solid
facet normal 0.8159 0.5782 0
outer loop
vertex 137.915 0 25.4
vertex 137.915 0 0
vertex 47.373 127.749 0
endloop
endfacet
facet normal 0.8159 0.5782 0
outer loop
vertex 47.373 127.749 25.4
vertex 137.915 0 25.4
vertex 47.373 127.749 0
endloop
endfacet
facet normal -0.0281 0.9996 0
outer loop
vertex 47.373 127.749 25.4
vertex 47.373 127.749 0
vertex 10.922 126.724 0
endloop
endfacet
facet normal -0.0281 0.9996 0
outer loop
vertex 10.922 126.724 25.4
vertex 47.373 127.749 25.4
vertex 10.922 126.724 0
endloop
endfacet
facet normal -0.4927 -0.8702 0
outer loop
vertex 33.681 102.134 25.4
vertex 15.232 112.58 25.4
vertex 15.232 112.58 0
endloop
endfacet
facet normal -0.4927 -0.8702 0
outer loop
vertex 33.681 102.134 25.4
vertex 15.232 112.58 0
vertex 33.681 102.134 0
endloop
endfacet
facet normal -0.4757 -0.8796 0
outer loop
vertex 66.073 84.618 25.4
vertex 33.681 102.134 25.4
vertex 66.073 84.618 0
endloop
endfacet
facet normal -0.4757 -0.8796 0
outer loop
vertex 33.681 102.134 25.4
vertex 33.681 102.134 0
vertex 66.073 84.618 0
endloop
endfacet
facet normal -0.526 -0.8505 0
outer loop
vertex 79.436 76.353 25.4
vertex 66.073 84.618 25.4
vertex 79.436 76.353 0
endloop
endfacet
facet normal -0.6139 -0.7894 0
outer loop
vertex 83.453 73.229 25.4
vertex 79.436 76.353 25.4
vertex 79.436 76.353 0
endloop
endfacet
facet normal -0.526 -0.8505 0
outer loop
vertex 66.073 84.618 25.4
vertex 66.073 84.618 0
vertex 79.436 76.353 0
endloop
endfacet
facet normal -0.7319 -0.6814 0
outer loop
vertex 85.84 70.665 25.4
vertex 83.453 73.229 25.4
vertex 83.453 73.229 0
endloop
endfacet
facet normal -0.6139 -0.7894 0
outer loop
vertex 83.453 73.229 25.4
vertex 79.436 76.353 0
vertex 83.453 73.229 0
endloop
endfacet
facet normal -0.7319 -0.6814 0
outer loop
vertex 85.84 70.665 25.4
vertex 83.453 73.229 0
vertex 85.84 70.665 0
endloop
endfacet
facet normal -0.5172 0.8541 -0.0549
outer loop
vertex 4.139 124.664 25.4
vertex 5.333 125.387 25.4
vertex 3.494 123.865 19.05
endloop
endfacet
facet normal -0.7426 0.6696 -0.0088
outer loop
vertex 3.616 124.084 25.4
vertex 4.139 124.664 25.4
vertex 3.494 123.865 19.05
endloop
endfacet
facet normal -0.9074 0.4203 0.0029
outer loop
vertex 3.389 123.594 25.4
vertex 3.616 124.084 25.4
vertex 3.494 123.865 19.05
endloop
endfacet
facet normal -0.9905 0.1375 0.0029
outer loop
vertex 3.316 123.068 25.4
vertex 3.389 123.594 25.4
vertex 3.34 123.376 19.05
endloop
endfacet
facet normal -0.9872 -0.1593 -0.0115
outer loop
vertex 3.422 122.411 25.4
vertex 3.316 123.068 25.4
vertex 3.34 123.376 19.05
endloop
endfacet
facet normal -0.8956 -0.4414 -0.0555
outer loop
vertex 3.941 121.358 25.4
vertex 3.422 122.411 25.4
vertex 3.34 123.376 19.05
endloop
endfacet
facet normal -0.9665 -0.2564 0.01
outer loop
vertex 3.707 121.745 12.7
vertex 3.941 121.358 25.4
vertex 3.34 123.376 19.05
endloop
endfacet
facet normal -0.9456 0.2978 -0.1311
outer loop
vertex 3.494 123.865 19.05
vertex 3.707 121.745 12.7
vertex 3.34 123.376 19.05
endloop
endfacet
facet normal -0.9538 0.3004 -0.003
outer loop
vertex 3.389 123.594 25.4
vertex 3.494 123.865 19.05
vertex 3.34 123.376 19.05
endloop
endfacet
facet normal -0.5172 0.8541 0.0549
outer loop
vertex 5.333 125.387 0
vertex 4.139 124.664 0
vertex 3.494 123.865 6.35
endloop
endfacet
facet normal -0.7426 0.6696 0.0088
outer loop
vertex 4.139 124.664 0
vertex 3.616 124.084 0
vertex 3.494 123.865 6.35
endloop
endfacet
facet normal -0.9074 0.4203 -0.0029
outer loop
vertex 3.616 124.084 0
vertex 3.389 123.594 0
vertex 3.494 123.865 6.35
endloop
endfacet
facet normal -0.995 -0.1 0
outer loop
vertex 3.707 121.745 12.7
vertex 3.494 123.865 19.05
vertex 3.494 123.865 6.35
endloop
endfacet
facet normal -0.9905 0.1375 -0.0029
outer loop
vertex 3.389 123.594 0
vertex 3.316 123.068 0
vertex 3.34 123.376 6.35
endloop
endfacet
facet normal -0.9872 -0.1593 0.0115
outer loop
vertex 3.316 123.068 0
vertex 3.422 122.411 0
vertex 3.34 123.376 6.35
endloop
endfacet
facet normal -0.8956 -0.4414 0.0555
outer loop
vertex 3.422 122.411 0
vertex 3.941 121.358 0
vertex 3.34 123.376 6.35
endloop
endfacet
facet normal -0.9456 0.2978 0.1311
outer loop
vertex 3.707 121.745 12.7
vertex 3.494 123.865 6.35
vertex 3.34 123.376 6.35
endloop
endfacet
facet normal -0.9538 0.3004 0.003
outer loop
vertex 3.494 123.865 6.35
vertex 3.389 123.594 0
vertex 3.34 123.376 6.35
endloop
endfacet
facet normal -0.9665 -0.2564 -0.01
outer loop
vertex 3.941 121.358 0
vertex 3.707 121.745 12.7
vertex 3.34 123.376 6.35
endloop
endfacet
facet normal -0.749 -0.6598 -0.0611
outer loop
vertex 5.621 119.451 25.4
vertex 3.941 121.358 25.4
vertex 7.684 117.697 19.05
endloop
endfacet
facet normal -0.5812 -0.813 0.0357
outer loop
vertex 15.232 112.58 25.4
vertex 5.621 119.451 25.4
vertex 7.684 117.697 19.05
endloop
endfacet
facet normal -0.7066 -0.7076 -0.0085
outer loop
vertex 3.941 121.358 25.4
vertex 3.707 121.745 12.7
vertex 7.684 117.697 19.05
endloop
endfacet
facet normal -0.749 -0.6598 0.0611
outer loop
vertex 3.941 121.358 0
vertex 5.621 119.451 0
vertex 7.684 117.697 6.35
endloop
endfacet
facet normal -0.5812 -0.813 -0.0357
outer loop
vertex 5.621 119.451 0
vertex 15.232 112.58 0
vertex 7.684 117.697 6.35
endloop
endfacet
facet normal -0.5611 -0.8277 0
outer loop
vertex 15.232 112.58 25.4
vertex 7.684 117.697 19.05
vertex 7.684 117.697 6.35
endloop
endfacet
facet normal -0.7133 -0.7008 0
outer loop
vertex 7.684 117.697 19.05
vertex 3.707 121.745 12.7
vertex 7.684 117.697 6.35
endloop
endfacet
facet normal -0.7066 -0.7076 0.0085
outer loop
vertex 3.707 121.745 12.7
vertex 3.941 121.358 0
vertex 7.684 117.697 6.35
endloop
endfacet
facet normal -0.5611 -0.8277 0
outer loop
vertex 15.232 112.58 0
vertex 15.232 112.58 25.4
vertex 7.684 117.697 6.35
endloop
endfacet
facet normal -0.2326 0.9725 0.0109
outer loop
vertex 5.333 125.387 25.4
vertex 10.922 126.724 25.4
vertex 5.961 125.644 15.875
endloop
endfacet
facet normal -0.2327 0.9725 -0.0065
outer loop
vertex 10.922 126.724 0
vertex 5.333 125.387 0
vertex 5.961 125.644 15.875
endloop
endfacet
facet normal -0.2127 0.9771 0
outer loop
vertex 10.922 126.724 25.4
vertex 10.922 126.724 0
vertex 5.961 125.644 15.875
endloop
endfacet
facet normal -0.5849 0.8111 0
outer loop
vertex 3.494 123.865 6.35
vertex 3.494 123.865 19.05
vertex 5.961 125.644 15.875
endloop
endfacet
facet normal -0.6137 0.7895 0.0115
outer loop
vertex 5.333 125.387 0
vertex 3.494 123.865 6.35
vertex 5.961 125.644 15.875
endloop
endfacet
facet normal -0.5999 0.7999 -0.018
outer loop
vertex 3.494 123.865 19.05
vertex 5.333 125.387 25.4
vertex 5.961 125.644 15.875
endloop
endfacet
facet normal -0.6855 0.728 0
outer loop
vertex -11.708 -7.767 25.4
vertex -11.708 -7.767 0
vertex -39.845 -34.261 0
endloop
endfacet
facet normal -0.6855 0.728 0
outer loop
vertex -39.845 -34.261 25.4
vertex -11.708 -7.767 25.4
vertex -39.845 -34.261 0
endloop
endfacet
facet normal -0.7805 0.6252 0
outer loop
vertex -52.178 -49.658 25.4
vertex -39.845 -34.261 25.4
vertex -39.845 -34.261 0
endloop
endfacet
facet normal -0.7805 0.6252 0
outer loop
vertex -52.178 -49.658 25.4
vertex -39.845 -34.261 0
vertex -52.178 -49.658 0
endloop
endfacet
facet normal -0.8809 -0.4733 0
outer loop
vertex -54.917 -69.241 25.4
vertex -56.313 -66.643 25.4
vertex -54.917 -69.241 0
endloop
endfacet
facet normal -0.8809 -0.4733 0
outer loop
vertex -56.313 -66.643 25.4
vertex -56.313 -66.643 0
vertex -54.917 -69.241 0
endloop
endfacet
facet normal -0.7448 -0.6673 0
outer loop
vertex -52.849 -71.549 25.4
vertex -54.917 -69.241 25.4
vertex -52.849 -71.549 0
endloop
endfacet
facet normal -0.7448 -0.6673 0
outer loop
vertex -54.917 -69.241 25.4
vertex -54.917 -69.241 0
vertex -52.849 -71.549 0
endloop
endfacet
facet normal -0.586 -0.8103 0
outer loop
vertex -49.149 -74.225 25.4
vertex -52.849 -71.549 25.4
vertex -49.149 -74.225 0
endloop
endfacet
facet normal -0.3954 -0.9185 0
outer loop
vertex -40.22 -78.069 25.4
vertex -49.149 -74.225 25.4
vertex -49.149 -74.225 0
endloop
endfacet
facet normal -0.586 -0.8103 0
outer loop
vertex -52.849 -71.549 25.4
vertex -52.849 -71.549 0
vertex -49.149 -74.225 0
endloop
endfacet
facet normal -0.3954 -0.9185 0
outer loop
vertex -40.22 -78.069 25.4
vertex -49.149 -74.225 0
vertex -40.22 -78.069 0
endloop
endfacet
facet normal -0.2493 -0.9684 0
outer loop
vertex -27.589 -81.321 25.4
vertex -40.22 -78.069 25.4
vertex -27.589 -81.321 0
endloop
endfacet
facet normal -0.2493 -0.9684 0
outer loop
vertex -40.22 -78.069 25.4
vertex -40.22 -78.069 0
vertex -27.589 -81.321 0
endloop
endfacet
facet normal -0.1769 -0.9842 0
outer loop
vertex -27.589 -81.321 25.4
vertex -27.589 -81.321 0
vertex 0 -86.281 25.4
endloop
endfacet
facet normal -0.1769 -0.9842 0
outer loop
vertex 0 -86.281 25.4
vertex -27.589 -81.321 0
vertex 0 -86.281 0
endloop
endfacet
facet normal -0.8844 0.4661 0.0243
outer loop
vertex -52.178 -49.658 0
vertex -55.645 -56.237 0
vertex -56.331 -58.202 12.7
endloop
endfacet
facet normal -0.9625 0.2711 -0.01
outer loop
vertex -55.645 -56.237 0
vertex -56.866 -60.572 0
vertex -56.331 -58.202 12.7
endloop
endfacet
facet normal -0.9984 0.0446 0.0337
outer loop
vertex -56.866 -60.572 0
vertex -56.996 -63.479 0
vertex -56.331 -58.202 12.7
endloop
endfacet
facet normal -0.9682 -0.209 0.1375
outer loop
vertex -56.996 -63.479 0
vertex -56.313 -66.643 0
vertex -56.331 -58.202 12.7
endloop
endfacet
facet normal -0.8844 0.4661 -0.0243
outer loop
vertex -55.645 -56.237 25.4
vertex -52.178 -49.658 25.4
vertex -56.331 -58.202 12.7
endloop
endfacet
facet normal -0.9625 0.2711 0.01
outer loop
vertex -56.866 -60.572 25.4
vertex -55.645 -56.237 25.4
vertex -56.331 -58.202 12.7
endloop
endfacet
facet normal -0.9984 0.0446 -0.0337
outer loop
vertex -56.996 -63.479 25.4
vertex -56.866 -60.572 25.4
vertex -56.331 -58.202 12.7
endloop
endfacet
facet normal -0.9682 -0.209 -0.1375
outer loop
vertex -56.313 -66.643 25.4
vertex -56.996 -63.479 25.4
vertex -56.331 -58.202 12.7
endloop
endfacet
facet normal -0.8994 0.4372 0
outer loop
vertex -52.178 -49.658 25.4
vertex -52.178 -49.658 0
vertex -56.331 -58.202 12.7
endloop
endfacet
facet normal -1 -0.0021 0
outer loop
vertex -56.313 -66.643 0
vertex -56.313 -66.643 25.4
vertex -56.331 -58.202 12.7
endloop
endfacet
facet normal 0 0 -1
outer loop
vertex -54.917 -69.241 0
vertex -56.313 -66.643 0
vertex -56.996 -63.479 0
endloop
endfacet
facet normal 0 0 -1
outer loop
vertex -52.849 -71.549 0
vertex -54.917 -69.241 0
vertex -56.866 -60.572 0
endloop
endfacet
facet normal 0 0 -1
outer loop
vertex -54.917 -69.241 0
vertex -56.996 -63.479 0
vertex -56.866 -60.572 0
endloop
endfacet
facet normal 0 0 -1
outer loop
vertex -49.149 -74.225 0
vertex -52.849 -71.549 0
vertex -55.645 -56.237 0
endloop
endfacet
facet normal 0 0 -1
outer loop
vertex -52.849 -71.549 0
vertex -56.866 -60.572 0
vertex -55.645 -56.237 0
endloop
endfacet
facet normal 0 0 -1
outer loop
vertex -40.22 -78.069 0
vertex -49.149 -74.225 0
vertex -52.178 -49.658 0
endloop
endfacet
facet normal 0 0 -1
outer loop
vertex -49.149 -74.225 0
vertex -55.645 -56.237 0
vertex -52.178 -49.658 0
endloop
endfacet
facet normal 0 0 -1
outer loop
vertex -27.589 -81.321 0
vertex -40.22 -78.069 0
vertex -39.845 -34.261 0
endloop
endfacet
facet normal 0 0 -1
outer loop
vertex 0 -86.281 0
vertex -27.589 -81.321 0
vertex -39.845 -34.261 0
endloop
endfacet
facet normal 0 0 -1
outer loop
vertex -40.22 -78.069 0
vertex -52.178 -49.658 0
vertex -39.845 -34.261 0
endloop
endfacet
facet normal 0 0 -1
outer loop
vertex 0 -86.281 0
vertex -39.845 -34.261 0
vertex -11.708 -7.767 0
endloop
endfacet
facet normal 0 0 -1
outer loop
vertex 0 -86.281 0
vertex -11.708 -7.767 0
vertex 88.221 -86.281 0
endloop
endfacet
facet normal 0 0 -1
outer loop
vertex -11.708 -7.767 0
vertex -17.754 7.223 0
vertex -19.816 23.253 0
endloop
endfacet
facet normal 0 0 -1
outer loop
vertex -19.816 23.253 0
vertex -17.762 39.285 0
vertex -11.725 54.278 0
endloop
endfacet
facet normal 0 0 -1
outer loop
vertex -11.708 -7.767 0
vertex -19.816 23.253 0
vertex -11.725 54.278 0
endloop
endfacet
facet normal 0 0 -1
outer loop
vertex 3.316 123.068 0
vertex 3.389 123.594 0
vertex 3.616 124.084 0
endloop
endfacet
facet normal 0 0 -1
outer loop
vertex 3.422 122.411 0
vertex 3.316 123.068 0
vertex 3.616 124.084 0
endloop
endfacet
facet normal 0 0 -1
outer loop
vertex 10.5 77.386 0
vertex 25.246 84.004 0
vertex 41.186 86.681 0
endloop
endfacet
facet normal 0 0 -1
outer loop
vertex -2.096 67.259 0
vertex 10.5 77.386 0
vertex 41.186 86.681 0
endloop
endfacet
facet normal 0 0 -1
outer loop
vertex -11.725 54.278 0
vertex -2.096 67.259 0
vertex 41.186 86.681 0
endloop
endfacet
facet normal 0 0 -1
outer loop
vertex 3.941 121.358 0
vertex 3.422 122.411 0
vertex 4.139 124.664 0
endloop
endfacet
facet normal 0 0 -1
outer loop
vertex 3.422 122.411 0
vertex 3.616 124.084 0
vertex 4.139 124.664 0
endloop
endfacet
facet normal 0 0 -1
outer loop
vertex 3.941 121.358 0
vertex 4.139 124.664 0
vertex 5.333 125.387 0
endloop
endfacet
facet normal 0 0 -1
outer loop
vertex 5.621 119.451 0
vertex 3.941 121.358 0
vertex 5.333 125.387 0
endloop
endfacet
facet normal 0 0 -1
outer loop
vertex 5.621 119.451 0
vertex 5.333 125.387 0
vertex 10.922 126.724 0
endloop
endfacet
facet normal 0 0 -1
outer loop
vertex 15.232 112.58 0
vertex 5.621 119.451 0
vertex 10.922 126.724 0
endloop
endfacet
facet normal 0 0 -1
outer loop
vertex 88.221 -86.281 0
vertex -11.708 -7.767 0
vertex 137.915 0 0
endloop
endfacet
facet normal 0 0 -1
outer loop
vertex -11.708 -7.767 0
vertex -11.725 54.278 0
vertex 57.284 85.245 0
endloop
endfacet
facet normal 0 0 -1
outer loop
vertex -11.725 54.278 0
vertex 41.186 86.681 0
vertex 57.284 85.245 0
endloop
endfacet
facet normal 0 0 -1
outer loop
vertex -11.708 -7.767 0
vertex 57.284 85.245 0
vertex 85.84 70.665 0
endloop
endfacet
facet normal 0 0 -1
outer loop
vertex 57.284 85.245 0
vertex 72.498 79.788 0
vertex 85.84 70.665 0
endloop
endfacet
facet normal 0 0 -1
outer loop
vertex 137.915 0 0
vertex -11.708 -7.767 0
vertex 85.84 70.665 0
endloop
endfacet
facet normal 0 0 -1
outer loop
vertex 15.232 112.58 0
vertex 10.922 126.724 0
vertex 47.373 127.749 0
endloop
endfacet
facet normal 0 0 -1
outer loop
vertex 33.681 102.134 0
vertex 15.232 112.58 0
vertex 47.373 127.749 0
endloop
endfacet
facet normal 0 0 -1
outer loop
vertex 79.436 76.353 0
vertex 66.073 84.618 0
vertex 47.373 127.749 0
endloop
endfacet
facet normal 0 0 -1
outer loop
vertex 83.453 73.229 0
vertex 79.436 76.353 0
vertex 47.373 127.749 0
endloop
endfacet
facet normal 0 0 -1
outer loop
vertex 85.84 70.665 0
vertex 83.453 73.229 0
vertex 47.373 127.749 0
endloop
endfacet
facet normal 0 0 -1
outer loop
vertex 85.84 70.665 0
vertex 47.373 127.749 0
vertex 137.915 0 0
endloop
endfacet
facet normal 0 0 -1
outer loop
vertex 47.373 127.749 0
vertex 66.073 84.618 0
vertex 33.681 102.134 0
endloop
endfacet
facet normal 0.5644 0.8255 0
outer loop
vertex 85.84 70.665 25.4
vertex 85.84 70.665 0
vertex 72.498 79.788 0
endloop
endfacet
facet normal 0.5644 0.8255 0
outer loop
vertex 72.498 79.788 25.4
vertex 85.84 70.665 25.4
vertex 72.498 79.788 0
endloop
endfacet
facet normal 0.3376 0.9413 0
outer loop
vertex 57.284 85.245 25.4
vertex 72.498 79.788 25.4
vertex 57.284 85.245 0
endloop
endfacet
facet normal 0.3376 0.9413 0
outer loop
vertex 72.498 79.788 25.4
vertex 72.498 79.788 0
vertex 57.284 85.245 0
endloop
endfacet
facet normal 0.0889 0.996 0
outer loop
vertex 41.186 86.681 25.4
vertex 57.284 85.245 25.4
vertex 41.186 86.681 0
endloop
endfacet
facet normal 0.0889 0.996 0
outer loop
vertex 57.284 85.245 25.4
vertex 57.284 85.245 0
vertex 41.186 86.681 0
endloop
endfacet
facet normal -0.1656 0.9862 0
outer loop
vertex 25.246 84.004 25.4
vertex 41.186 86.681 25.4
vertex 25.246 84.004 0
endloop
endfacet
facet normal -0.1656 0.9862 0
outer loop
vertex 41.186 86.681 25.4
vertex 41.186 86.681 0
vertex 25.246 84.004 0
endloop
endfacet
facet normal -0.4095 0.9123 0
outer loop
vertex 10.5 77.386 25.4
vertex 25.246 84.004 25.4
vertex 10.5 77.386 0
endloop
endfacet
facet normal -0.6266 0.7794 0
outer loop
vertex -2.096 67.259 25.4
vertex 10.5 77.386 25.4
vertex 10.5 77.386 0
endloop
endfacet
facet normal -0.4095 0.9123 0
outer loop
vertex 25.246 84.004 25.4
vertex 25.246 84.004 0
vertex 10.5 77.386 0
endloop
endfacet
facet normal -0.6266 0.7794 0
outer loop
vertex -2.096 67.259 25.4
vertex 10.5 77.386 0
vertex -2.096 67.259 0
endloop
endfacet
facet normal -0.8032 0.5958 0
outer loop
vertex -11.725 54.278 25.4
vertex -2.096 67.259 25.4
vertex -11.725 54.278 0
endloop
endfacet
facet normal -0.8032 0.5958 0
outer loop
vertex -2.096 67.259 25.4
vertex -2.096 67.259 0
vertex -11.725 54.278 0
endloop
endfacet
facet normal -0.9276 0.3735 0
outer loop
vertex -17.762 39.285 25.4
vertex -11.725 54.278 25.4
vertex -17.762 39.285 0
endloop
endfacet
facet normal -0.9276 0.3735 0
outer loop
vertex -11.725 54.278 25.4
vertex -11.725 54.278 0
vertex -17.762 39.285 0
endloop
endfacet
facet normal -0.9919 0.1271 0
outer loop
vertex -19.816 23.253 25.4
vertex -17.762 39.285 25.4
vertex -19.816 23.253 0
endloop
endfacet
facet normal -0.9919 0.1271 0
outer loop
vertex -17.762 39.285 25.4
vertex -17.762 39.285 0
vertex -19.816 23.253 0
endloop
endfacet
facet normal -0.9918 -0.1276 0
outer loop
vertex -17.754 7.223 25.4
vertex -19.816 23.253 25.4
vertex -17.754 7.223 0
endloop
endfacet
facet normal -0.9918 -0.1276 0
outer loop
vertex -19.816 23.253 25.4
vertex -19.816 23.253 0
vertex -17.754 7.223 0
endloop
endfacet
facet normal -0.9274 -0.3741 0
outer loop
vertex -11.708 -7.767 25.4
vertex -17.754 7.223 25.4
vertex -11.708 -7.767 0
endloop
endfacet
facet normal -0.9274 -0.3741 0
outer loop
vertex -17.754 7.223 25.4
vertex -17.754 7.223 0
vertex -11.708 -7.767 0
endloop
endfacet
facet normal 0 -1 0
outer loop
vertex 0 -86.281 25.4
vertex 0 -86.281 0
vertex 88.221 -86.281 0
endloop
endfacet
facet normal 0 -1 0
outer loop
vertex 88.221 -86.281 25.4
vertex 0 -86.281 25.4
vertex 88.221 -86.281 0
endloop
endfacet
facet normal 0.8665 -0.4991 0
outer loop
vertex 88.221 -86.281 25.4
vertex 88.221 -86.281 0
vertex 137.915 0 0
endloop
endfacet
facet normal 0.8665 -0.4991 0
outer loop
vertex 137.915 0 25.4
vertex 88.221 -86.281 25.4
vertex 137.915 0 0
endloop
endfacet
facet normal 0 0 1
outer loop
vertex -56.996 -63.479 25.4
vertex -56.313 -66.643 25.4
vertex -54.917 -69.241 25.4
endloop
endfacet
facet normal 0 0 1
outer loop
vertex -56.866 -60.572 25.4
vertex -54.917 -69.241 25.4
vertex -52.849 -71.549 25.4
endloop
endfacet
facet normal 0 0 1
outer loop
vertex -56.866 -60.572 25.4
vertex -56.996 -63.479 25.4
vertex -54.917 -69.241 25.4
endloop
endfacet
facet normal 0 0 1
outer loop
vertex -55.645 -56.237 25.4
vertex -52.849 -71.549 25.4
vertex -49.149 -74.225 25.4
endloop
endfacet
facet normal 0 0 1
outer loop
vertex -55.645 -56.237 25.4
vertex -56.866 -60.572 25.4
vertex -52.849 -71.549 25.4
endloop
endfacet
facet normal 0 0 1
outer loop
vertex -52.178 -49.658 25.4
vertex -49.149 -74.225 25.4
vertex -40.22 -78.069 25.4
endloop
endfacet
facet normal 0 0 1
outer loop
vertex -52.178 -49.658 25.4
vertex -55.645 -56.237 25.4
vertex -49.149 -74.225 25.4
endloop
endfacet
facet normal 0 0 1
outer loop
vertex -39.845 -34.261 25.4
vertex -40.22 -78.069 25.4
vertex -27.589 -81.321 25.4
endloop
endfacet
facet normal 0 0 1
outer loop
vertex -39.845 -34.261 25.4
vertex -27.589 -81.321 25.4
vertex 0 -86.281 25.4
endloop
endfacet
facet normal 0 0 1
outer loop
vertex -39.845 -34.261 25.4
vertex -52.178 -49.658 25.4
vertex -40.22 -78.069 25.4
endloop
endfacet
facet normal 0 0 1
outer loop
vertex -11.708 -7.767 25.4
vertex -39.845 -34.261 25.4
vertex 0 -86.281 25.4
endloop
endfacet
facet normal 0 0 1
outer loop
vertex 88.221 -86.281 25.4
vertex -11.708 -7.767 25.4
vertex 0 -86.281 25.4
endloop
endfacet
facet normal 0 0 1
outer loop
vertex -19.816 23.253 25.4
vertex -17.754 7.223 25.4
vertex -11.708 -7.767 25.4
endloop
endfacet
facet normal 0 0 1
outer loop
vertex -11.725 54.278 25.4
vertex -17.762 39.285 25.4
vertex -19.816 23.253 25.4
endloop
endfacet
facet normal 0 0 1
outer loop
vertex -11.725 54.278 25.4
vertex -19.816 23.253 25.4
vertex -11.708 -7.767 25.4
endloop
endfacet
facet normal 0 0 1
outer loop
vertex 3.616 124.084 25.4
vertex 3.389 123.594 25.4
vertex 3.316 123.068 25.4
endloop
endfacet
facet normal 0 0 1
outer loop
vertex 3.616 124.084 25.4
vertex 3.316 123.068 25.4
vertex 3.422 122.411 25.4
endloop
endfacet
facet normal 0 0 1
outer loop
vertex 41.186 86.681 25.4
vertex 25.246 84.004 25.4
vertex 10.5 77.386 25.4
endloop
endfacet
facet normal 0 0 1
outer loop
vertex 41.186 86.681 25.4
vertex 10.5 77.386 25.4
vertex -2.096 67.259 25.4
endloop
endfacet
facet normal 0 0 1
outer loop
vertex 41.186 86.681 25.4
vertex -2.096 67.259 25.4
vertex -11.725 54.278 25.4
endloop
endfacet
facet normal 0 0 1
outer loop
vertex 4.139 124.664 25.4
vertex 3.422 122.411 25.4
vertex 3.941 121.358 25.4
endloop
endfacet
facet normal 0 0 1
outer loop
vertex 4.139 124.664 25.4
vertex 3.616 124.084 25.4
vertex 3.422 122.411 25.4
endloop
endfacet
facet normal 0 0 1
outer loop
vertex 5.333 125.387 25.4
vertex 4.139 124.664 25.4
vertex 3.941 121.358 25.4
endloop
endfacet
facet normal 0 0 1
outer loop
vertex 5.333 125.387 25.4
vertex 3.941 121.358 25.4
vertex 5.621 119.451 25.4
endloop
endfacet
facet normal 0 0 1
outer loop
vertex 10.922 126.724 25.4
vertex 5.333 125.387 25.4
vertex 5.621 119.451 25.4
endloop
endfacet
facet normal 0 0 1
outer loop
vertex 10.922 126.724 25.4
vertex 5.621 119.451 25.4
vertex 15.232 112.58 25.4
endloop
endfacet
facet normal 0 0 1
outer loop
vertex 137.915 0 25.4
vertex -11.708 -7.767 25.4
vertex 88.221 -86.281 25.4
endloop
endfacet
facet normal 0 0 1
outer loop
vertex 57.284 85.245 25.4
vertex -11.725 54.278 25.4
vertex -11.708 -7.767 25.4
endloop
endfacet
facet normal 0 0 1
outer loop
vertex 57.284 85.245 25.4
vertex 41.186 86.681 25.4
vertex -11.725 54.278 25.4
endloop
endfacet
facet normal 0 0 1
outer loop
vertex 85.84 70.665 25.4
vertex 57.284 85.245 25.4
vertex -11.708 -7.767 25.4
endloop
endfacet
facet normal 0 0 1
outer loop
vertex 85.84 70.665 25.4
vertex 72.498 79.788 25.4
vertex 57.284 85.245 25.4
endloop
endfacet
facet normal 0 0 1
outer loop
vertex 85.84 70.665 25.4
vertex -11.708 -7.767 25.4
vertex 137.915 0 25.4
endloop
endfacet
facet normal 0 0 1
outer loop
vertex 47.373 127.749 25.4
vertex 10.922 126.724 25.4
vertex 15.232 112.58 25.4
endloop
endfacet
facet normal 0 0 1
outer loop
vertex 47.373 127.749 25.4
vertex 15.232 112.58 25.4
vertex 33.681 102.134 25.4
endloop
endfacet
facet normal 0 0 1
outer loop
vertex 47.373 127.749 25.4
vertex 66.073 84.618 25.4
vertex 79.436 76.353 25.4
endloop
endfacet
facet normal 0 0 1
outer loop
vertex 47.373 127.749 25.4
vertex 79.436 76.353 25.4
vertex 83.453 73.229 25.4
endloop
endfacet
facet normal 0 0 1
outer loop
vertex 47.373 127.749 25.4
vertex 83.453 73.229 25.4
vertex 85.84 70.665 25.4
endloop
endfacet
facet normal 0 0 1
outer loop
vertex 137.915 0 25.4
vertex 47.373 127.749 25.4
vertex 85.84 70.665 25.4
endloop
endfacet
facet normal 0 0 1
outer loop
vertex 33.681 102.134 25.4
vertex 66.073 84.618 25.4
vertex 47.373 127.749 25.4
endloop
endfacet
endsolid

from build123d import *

# Parameters (mm, degrees)
F1_DEPTH = 25.4


with BuildPart() as f1:
    # F0 (on Top) → F1 (new body)
    with BuildSketch(Plane.XY):
        with BuildLine():
            ThreePointArc((-11.7081835018, -7.7665143543), (59.6811480437, -38.127330417), (107.1000091665, 23.2702869661))
            ThreePointArc((107.1000091665, 23.2702869661), (104.1082493558, 42.5252029756), (95.4150658412, 59.9645543878))
            ThreePointArc((95.4150658412, 59.9645543878), (90.9311124747, 65.5864743042), (85.839894487, 70.6649899084))
            add(Edge.make_bspline(
                [(85.839894487, 70.6649899084), (87.6005318882, 68.0998092399), (85.9514364748, 65.7543116615), (86.1645179317, 65.8607681858), (28.4050818403, 26.6517596455), (-11.7081835018, -7.7665143543)],
                knots=[0.4006748205, 0.4006748205, 0.4006748205, 0.4006748205, 0.4535750536, 0.4733015683, 0.6871358358, 0.6871358358, 0.6871358358, 0.6871358358], degree=3))
        make_face()
        with BuildLine():
            ThreePointArc((95.4150658412, 59.9645543878), (104.1082493558, 42.5252029756), (107.1000091665, 23.2702869661))
            ThreePointArc((107.1000091665, 23.2702869661), (59.6811480437, -38.127330417), (-11.7081835018, -7.7665143543))
            add(Edge.make_bspline(
                [(-11.7081835018, -7.7665143543), (-34.2010392805, -27.065997122), (-82.4164228968, -76.2103782849), (-29.6834002558, -80.8748349345), (0, -86.2805619836)],
                knots=[0.6871358358, 0.6871358358, 0.6871358358, 0.6871358358, 0.8070398949, 1, 1, 1, 1], degree=3))
            Line((0, -86.2805619836), (88.2210006001, -86.2805619836))
            Line((88.2210006001, -86.2805619836), (137.915045023, 0))
            Line((137.915045023, 0), (95.4150658412, 59.9645543878))
        make_face()
        with BuildLine():
            ThreePointArc((85.839894487, 70.6649899084), (90.9311124747, 65.5864743042), (95.4150658412, 59.9645543878))
            Line((95.4150658412, 59.9645543878), (47.3727946642, 127.7489024833))
            add(Edge.make_bspline(
                [(47.3727946642, 127.7489024833), (24.7222504454, 127.194182006), (-36.893516181, 131.0354918084), (77.878779773, 82.2640264565), (85.839894487, 70.6649899084)],
                knots=[0, 0, 0, 0, 0.1614746174, 0.4006748205, 0.4006748205, 0.4006748205, 0.4006748205], degree=3))
        make_face()
        with BuildLine():
            ThreePointArc((85.839894487, 70.6649899084), (3.8786648091, 72.7253384391), (-11.7081835018, -7.7665143543))
            add(Edge.make_bspline(
                [(85.839894487, 70.6649899084), (87.6005318882, 68.0998092399), (85.9514364748, 65.7543116615), (86.1645179317, 65.8607681858), (28.4050818403, 26.6517596455), (-11.7081835018, -7.7665143543)],
                knots=[0.4006748205, 0.4006748205, 0.4006748205, 0.4006748205, 0.4535750536, 0.4733015683, 0.6871358358, 0.6871358358, 0.6871358358, 0.6871358358], degree=3))
        make_face()
    extrude(amount=F1_DEPTH)


solid = f1.part
